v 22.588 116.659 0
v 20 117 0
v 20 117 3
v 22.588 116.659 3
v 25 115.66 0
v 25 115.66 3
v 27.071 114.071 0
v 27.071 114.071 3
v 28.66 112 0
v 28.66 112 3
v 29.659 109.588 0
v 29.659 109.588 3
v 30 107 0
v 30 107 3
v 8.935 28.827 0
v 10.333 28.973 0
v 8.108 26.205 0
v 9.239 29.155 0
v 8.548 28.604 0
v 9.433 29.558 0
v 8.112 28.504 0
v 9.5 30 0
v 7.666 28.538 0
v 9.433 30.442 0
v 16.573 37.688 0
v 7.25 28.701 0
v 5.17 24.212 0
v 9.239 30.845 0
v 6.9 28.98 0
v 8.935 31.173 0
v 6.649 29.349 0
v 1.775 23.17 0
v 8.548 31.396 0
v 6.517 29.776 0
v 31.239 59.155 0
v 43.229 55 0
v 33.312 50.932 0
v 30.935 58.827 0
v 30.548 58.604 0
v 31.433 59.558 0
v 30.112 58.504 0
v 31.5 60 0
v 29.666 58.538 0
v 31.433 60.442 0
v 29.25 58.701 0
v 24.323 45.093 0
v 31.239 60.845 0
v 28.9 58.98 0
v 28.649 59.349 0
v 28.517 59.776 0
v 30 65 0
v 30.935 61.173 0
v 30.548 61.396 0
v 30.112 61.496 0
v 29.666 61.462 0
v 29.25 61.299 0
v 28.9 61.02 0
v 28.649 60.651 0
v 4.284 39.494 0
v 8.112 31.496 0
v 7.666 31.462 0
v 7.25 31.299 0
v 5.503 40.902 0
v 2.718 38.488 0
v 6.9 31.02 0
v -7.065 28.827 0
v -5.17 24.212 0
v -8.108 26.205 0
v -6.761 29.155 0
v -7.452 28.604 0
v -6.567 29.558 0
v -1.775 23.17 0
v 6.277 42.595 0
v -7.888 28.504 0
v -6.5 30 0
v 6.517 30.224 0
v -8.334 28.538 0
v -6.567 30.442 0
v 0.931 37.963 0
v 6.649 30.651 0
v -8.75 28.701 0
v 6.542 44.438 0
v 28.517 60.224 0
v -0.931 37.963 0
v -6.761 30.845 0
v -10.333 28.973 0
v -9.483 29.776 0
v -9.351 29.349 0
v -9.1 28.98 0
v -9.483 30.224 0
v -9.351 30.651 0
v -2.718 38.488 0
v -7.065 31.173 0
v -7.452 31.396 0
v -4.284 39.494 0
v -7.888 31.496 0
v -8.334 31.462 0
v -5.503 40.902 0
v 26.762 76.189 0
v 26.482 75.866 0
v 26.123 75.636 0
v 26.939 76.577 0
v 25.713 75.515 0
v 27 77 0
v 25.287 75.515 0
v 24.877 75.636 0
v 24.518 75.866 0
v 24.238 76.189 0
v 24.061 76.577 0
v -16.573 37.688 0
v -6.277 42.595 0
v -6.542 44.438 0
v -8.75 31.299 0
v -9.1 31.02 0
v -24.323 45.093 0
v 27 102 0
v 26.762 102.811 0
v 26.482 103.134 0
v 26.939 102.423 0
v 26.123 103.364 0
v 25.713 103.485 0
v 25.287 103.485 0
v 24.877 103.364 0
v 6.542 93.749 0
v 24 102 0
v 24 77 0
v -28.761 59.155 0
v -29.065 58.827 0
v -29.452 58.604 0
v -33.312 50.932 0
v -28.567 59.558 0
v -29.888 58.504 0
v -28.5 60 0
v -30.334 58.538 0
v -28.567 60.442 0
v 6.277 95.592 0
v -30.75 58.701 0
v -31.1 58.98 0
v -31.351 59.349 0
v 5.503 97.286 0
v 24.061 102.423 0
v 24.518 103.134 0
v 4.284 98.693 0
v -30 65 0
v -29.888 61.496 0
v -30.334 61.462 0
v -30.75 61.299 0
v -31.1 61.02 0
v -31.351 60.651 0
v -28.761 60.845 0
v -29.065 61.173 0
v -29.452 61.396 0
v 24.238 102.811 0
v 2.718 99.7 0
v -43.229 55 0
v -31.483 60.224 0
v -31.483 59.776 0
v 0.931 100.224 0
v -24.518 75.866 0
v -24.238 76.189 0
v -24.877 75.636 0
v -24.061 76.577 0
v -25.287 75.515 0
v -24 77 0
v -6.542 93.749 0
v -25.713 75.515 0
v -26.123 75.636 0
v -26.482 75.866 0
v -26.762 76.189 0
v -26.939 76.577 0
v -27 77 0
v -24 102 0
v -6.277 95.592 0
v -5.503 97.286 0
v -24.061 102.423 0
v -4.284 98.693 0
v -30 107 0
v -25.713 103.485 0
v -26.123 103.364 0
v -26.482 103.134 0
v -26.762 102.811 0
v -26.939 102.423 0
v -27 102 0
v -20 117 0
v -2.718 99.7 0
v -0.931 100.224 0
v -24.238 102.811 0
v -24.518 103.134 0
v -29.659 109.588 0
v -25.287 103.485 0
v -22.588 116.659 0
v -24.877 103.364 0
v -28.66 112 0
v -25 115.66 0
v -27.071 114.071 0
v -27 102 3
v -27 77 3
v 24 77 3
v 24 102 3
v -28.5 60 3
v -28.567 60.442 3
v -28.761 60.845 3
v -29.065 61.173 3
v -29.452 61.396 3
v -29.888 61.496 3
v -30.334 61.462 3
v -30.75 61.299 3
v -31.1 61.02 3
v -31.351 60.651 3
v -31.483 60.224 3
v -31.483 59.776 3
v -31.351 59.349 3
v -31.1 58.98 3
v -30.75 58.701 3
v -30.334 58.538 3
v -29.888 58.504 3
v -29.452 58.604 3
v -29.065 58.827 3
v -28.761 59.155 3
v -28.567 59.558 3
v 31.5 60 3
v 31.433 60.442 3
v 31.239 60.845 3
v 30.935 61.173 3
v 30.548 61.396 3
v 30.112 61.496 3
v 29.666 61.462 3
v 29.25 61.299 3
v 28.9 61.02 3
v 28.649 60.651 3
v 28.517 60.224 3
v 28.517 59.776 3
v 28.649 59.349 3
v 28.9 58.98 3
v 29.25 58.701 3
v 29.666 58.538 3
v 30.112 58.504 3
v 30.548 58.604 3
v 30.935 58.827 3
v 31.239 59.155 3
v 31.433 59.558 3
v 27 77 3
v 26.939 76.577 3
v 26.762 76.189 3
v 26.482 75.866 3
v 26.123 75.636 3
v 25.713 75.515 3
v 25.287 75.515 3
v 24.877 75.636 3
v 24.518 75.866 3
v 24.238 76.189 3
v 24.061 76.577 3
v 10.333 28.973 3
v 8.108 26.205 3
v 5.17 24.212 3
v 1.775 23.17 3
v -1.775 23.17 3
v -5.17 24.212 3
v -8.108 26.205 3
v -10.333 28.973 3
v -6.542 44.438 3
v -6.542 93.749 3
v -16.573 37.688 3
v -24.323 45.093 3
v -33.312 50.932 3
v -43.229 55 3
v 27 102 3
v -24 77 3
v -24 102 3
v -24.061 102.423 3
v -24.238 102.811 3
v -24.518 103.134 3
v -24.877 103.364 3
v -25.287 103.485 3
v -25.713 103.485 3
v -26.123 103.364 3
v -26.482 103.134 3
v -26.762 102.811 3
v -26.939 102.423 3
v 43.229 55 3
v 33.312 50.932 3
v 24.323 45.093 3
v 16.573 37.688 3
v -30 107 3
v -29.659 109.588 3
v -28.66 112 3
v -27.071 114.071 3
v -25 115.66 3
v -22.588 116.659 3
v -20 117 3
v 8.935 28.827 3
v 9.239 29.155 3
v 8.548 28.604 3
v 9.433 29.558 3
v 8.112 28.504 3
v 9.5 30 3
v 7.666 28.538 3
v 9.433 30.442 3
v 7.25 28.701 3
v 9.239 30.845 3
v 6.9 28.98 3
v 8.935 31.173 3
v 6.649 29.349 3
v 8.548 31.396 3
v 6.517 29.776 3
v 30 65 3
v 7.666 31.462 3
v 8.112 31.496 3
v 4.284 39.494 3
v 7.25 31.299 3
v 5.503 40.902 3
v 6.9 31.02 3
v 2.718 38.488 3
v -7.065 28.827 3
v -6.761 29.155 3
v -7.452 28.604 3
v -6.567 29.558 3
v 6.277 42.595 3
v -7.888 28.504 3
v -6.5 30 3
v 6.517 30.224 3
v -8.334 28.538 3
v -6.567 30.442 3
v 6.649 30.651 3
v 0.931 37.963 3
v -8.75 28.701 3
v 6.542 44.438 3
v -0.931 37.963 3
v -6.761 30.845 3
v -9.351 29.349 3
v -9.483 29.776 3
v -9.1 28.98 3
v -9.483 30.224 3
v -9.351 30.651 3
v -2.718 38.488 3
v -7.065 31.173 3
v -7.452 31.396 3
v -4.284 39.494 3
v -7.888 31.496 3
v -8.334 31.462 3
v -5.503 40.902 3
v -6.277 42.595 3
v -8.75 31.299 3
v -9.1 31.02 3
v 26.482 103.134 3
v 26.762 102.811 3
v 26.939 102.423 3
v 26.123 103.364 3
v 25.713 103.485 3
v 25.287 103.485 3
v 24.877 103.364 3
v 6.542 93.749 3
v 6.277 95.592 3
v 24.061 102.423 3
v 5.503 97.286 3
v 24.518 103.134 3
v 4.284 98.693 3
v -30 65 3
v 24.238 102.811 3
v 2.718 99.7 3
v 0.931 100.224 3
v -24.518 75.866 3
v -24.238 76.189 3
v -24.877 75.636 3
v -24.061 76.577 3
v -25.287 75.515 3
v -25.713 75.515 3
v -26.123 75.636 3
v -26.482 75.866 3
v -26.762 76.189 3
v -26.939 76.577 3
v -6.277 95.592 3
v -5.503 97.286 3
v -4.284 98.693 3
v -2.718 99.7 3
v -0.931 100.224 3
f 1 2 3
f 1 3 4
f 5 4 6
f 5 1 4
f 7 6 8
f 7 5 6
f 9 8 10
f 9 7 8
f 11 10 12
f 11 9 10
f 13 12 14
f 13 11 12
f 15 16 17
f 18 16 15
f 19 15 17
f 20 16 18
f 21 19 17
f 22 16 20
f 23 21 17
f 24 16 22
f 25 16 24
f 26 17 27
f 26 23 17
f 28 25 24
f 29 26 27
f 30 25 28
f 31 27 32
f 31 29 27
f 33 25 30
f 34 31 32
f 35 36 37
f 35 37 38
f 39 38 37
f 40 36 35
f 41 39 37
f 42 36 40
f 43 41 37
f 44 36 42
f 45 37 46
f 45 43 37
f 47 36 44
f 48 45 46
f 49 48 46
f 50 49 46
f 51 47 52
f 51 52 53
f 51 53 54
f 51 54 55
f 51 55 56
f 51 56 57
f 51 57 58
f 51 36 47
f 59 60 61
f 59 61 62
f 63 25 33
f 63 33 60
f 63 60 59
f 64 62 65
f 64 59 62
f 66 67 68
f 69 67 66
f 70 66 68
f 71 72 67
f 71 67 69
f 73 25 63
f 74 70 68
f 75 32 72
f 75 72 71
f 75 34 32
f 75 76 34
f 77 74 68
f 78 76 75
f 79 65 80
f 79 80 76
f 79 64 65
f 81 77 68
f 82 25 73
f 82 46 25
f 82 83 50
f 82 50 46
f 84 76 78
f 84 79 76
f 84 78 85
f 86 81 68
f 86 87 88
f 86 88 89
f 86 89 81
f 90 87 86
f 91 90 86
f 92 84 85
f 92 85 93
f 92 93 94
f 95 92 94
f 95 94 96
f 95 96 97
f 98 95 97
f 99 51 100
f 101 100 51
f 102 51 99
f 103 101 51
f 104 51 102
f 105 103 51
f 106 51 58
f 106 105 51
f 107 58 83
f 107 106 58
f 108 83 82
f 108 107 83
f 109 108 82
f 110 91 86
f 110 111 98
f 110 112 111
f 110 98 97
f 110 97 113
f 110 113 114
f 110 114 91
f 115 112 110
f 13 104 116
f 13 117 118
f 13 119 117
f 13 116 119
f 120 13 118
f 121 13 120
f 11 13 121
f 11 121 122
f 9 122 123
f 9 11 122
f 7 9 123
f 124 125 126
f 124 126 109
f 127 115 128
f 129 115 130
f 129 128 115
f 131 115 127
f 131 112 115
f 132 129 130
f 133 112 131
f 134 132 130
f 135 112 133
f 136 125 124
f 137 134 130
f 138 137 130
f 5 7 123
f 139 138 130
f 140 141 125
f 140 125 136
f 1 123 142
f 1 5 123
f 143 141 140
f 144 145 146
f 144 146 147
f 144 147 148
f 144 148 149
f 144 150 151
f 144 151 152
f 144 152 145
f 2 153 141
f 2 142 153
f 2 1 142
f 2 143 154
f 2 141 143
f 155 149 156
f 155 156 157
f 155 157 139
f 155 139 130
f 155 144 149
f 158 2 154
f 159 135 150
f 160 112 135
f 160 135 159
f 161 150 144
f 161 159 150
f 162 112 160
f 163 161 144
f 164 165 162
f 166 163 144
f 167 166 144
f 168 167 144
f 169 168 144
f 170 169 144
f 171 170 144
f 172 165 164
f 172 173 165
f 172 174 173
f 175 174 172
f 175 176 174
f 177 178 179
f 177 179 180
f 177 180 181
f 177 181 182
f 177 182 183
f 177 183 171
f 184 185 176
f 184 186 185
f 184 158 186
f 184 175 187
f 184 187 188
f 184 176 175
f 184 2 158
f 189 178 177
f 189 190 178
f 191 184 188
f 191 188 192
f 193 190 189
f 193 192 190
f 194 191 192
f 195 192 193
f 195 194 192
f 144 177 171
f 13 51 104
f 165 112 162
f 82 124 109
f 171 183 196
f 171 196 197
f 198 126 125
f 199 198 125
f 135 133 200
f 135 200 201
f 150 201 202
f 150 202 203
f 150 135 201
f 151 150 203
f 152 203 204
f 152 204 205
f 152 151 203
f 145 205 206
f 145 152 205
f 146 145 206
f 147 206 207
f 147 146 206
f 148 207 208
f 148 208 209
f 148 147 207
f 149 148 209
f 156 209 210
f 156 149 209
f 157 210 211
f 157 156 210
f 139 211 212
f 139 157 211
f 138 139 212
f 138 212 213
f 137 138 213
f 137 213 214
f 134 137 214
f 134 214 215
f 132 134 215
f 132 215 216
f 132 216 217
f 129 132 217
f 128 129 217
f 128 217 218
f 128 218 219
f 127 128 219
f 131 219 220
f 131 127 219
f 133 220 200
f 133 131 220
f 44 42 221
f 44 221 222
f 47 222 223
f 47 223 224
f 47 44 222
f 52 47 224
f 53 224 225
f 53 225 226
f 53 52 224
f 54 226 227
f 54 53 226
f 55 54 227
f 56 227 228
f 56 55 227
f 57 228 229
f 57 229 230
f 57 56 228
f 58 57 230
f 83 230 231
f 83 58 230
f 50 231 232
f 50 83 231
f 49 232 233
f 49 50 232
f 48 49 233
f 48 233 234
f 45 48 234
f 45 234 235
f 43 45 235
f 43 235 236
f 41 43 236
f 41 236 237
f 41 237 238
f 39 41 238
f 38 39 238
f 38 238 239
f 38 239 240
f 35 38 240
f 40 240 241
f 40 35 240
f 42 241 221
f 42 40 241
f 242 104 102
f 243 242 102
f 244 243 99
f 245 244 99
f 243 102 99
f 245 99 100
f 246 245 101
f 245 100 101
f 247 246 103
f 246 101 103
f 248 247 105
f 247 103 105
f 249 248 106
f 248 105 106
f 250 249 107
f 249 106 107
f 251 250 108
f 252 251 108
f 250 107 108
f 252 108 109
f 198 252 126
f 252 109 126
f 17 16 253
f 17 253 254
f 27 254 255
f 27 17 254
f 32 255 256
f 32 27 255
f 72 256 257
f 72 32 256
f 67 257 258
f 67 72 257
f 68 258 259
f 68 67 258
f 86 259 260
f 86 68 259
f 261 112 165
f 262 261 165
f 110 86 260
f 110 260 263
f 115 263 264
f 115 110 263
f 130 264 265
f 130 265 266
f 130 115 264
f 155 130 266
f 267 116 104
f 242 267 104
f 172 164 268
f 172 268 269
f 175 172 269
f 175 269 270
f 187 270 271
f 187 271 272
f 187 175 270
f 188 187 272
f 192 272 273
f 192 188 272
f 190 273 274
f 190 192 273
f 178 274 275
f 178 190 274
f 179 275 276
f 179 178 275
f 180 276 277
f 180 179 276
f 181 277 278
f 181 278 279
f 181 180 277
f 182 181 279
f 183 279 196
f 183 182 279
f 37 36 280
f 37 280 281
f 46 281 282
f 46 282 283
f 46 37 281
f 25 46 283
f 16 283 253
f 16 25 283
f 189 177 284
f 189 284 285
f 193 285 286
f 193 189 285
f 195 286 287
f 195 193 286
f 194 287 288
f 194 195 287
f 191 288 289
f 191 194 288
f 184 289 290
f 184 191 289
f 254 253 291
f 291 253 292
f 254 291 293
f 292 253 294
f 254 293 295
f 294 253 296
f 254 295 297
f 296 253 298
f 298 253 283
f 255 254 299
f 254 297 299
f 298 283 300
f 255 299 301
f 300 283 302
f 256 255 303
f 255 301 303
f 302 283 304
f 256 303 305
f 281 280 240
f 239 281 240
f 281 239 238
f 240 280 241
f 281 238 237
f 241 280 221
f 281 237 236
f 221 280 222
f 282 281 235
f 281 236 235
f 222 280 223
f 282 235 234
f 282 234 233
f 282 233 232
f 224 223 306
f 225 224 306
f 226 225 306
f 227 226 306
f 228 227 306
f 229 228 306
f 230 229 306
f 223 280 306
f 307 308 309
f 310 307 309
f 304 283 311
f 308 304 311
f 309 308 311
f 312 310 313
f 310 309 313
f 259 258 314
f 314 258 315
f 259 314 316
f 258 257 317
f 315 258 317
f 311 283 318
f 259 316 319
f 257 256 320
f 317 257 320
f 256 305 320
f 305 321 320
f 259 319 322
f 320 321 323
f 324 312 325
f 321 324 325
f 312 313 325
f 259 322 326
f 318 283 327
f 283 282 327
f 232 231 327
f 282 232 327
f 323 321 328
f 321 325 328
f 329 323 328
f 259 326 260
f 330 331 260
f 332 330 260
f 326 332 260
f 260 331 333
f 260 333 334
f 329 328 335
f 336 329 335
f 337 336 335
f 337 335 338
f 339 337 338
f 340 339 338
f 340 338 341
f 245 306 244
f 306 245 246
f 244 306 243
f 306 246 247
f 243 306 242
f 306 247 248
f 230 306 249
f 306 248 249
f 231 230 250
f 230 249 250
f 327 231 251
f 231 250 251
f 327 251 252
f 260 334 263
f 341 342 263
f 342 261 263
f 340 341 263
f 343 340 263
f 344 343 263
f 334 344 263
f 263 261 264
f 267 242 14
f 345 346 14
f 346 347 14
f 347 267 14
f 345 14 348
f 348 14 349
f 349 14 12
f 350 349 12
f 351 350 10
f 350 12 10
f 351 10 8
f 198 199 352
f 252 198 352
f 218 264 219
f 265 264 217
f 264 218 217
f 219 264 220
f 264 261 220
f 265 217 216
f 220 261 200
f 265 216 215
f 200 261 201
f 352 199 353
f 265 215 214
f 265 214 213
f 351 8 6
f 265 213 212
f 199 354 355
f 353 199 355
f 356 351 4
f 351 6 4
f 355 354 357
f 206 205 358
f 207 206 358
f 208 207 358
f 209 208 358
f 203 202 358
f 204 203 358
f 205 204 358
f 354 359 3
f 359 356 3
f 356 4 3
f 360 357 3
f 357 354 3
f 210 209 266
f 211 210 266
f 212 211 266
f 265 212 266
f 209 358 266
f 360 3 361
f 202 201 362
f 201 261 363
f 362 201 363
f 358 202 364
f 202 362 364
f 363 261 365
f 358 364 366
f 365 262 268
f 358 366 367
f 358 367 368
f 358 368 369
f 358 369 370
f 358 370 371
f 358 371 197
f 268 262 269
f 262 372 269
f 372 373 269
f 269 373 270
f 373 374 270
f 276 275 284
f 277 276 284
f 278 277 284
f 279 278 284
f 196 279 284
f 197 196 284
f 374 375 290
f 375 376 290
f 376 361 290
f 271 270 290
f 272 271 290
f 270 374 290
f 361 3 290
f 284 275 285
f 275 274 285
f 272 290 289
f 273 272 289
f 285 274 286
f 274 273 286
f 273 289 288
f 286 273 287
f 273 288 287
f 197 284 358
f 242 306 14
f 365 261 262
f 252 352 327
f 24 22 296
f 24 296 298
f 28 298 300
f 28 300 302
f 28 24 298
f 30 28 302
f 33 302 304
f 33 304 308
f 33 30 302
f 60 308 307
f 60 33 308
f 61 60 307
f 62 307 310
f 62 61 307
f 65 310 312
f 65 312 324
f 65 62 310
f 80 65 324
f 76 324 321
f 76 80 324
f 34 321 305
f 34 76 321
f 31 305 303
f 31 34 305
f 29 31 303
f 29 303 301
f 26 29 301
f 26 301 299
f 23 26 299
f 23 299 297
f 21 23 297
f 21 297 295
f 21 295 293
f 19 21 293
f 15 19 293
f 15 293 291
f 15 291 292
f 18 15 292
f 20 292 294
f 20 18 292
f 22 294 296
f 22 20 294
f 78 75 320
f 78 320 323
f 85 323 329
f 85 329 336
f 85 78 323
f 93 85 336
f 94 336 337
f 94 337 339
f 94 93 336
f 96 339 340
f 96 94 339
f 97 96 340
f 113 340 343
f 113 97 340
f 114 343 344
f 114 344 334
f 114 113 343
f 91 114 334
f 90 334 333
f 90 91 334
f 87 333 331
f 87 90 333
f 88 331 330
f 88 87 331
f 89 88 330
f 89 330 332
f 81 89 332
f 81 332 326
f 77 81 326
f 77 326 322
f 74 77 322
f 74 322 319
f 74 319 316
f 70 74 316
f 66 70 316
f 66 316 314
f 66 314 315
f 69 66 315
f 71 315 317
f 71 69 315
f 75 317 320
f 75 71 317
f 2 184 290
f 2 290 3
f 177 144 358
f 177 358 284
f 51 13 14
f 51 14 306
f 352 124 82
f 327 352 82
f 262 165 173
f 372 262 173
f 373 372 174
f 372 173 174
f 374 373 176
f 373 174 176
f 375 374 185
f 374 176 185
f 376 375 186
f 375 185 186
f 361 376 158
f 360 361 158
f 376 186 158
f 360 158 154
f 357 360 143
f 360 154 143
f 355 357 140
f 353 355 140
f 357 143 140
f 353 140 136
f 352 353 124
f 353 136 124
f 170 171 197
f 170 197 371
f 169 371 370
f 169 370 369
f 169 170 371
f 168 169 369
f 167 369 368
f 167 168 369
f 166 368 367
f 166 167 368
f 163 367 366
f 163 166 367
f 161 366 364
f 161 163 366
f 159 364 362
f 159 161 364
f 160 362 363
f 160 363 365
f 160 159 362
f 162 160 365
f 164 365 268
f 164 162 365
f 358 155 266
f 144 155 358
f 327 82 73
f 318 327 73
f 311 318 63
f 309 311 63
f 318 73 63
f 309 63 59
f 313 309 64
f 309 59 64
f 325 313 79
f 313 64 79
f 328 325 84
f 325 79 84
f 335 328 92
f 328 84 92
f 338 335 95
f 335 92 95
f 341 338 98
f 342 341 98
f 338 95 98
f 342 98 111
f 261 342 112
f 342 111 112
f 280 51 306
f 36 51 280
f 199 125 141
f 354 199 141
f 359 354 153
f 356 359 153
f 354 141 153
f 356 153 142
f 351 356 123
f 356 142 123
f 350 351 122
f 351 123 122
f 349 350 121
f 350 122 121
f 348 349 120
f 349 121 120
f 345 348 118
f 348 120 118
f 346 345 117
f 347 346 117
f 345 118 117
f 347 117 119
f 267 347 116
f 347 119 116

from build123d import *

# Parameters (mm, degrees)
SKETCH_1_R      = 1.5
EXTRUDE_1_DEPTH = 3


with BuildPart() as part:
    # 草图1 → 凸台-拉伸1 (new body)
    with BuildSketch(Plane.XY):
        with BuildLine():
            Line((30, 65), (43.229490169, 55))
            ThreePointArc((43.229490169, 55), (24.322951332, 45.093216766), (10.332713198, 28.972583968))
            ThreePointArc((10.332713198, 28.972583968), (0, 23.037780053), (-10.332713198, 28.972583968))
            ThreePointArc((-10.332713198, 28.972583968), (-24.322951332, 45.093216766), (-43.229490169, 55))
            Line((-43.229490169, 55), (-30, 65))
            Line((-30, 65), (-30, 107))
            ThreePointArc((-30, 107), (-27.071067812, 114.071067812), (-20, 117))
            Line((-20, 117), (20, 117))
            ThreePointArc((20, 117), (27.071067812, 114.071067812), (30, 107))
            Line((30, 107), (30, 65))
        make_face()
        with Locations((-30, 60)):
            Circle(SKETCH_1_R, mode=Mode.SUBTRACT)
        with Locations((-8, 30)):
            Circle(SKETCH_1_R, mode=Mode.SUBTRACT)
        with Locations((8, 30)):
            Circle(SKETCH_1_R, mode=Mode.SUBTRACT)
        with Locations((30, 60)):
            Circle(SKETCH_1_R, mode=Mode.SUBTRACT)
        with BuildLine():
            Line((27, 102), (27, 77))
            ThreePointArc((27, 77), (25.5, 75.5), (24, 77))
            Line((24, 77), (24, 102))
            ThreePointArc((24, 102), (25.5, 103.5), (27, 102))
        make_face(mode=Mode.SUBTRACT)
        with BuildLine():
            Line((-27, 102), (-27, 77))
            ThreePointArc((-27, 77), (-25.5, 75.5), (-24, 77))
            Line((-24, 77), (-24, 102))
            ThreePointArc((-24, 102), (-25.5, 103.5), (-27, 102))
        make_face(mode=Mode.SUBTRACT)
        with BuildLine():
            Line((-6.54179371, 44.438430627), (-6.54179371, 93.748949186))
            ThreePointArc((-6.54179371, 93.748949186), (0, 100.290742896), (6.54179371, 93.748949186))
            Line((6.54179371, 93.748949186), (6.54179371, 44.438430627))
            ThreePointArc((6.54179371, 44.438430627), (0, 37.896636917), (-6.54179371, 44.438430627))
        make_face(mode=Mode.SUBTRACT)
    extrude(amount=EXTRUDE_1_DEPTH)


solid = part.part
